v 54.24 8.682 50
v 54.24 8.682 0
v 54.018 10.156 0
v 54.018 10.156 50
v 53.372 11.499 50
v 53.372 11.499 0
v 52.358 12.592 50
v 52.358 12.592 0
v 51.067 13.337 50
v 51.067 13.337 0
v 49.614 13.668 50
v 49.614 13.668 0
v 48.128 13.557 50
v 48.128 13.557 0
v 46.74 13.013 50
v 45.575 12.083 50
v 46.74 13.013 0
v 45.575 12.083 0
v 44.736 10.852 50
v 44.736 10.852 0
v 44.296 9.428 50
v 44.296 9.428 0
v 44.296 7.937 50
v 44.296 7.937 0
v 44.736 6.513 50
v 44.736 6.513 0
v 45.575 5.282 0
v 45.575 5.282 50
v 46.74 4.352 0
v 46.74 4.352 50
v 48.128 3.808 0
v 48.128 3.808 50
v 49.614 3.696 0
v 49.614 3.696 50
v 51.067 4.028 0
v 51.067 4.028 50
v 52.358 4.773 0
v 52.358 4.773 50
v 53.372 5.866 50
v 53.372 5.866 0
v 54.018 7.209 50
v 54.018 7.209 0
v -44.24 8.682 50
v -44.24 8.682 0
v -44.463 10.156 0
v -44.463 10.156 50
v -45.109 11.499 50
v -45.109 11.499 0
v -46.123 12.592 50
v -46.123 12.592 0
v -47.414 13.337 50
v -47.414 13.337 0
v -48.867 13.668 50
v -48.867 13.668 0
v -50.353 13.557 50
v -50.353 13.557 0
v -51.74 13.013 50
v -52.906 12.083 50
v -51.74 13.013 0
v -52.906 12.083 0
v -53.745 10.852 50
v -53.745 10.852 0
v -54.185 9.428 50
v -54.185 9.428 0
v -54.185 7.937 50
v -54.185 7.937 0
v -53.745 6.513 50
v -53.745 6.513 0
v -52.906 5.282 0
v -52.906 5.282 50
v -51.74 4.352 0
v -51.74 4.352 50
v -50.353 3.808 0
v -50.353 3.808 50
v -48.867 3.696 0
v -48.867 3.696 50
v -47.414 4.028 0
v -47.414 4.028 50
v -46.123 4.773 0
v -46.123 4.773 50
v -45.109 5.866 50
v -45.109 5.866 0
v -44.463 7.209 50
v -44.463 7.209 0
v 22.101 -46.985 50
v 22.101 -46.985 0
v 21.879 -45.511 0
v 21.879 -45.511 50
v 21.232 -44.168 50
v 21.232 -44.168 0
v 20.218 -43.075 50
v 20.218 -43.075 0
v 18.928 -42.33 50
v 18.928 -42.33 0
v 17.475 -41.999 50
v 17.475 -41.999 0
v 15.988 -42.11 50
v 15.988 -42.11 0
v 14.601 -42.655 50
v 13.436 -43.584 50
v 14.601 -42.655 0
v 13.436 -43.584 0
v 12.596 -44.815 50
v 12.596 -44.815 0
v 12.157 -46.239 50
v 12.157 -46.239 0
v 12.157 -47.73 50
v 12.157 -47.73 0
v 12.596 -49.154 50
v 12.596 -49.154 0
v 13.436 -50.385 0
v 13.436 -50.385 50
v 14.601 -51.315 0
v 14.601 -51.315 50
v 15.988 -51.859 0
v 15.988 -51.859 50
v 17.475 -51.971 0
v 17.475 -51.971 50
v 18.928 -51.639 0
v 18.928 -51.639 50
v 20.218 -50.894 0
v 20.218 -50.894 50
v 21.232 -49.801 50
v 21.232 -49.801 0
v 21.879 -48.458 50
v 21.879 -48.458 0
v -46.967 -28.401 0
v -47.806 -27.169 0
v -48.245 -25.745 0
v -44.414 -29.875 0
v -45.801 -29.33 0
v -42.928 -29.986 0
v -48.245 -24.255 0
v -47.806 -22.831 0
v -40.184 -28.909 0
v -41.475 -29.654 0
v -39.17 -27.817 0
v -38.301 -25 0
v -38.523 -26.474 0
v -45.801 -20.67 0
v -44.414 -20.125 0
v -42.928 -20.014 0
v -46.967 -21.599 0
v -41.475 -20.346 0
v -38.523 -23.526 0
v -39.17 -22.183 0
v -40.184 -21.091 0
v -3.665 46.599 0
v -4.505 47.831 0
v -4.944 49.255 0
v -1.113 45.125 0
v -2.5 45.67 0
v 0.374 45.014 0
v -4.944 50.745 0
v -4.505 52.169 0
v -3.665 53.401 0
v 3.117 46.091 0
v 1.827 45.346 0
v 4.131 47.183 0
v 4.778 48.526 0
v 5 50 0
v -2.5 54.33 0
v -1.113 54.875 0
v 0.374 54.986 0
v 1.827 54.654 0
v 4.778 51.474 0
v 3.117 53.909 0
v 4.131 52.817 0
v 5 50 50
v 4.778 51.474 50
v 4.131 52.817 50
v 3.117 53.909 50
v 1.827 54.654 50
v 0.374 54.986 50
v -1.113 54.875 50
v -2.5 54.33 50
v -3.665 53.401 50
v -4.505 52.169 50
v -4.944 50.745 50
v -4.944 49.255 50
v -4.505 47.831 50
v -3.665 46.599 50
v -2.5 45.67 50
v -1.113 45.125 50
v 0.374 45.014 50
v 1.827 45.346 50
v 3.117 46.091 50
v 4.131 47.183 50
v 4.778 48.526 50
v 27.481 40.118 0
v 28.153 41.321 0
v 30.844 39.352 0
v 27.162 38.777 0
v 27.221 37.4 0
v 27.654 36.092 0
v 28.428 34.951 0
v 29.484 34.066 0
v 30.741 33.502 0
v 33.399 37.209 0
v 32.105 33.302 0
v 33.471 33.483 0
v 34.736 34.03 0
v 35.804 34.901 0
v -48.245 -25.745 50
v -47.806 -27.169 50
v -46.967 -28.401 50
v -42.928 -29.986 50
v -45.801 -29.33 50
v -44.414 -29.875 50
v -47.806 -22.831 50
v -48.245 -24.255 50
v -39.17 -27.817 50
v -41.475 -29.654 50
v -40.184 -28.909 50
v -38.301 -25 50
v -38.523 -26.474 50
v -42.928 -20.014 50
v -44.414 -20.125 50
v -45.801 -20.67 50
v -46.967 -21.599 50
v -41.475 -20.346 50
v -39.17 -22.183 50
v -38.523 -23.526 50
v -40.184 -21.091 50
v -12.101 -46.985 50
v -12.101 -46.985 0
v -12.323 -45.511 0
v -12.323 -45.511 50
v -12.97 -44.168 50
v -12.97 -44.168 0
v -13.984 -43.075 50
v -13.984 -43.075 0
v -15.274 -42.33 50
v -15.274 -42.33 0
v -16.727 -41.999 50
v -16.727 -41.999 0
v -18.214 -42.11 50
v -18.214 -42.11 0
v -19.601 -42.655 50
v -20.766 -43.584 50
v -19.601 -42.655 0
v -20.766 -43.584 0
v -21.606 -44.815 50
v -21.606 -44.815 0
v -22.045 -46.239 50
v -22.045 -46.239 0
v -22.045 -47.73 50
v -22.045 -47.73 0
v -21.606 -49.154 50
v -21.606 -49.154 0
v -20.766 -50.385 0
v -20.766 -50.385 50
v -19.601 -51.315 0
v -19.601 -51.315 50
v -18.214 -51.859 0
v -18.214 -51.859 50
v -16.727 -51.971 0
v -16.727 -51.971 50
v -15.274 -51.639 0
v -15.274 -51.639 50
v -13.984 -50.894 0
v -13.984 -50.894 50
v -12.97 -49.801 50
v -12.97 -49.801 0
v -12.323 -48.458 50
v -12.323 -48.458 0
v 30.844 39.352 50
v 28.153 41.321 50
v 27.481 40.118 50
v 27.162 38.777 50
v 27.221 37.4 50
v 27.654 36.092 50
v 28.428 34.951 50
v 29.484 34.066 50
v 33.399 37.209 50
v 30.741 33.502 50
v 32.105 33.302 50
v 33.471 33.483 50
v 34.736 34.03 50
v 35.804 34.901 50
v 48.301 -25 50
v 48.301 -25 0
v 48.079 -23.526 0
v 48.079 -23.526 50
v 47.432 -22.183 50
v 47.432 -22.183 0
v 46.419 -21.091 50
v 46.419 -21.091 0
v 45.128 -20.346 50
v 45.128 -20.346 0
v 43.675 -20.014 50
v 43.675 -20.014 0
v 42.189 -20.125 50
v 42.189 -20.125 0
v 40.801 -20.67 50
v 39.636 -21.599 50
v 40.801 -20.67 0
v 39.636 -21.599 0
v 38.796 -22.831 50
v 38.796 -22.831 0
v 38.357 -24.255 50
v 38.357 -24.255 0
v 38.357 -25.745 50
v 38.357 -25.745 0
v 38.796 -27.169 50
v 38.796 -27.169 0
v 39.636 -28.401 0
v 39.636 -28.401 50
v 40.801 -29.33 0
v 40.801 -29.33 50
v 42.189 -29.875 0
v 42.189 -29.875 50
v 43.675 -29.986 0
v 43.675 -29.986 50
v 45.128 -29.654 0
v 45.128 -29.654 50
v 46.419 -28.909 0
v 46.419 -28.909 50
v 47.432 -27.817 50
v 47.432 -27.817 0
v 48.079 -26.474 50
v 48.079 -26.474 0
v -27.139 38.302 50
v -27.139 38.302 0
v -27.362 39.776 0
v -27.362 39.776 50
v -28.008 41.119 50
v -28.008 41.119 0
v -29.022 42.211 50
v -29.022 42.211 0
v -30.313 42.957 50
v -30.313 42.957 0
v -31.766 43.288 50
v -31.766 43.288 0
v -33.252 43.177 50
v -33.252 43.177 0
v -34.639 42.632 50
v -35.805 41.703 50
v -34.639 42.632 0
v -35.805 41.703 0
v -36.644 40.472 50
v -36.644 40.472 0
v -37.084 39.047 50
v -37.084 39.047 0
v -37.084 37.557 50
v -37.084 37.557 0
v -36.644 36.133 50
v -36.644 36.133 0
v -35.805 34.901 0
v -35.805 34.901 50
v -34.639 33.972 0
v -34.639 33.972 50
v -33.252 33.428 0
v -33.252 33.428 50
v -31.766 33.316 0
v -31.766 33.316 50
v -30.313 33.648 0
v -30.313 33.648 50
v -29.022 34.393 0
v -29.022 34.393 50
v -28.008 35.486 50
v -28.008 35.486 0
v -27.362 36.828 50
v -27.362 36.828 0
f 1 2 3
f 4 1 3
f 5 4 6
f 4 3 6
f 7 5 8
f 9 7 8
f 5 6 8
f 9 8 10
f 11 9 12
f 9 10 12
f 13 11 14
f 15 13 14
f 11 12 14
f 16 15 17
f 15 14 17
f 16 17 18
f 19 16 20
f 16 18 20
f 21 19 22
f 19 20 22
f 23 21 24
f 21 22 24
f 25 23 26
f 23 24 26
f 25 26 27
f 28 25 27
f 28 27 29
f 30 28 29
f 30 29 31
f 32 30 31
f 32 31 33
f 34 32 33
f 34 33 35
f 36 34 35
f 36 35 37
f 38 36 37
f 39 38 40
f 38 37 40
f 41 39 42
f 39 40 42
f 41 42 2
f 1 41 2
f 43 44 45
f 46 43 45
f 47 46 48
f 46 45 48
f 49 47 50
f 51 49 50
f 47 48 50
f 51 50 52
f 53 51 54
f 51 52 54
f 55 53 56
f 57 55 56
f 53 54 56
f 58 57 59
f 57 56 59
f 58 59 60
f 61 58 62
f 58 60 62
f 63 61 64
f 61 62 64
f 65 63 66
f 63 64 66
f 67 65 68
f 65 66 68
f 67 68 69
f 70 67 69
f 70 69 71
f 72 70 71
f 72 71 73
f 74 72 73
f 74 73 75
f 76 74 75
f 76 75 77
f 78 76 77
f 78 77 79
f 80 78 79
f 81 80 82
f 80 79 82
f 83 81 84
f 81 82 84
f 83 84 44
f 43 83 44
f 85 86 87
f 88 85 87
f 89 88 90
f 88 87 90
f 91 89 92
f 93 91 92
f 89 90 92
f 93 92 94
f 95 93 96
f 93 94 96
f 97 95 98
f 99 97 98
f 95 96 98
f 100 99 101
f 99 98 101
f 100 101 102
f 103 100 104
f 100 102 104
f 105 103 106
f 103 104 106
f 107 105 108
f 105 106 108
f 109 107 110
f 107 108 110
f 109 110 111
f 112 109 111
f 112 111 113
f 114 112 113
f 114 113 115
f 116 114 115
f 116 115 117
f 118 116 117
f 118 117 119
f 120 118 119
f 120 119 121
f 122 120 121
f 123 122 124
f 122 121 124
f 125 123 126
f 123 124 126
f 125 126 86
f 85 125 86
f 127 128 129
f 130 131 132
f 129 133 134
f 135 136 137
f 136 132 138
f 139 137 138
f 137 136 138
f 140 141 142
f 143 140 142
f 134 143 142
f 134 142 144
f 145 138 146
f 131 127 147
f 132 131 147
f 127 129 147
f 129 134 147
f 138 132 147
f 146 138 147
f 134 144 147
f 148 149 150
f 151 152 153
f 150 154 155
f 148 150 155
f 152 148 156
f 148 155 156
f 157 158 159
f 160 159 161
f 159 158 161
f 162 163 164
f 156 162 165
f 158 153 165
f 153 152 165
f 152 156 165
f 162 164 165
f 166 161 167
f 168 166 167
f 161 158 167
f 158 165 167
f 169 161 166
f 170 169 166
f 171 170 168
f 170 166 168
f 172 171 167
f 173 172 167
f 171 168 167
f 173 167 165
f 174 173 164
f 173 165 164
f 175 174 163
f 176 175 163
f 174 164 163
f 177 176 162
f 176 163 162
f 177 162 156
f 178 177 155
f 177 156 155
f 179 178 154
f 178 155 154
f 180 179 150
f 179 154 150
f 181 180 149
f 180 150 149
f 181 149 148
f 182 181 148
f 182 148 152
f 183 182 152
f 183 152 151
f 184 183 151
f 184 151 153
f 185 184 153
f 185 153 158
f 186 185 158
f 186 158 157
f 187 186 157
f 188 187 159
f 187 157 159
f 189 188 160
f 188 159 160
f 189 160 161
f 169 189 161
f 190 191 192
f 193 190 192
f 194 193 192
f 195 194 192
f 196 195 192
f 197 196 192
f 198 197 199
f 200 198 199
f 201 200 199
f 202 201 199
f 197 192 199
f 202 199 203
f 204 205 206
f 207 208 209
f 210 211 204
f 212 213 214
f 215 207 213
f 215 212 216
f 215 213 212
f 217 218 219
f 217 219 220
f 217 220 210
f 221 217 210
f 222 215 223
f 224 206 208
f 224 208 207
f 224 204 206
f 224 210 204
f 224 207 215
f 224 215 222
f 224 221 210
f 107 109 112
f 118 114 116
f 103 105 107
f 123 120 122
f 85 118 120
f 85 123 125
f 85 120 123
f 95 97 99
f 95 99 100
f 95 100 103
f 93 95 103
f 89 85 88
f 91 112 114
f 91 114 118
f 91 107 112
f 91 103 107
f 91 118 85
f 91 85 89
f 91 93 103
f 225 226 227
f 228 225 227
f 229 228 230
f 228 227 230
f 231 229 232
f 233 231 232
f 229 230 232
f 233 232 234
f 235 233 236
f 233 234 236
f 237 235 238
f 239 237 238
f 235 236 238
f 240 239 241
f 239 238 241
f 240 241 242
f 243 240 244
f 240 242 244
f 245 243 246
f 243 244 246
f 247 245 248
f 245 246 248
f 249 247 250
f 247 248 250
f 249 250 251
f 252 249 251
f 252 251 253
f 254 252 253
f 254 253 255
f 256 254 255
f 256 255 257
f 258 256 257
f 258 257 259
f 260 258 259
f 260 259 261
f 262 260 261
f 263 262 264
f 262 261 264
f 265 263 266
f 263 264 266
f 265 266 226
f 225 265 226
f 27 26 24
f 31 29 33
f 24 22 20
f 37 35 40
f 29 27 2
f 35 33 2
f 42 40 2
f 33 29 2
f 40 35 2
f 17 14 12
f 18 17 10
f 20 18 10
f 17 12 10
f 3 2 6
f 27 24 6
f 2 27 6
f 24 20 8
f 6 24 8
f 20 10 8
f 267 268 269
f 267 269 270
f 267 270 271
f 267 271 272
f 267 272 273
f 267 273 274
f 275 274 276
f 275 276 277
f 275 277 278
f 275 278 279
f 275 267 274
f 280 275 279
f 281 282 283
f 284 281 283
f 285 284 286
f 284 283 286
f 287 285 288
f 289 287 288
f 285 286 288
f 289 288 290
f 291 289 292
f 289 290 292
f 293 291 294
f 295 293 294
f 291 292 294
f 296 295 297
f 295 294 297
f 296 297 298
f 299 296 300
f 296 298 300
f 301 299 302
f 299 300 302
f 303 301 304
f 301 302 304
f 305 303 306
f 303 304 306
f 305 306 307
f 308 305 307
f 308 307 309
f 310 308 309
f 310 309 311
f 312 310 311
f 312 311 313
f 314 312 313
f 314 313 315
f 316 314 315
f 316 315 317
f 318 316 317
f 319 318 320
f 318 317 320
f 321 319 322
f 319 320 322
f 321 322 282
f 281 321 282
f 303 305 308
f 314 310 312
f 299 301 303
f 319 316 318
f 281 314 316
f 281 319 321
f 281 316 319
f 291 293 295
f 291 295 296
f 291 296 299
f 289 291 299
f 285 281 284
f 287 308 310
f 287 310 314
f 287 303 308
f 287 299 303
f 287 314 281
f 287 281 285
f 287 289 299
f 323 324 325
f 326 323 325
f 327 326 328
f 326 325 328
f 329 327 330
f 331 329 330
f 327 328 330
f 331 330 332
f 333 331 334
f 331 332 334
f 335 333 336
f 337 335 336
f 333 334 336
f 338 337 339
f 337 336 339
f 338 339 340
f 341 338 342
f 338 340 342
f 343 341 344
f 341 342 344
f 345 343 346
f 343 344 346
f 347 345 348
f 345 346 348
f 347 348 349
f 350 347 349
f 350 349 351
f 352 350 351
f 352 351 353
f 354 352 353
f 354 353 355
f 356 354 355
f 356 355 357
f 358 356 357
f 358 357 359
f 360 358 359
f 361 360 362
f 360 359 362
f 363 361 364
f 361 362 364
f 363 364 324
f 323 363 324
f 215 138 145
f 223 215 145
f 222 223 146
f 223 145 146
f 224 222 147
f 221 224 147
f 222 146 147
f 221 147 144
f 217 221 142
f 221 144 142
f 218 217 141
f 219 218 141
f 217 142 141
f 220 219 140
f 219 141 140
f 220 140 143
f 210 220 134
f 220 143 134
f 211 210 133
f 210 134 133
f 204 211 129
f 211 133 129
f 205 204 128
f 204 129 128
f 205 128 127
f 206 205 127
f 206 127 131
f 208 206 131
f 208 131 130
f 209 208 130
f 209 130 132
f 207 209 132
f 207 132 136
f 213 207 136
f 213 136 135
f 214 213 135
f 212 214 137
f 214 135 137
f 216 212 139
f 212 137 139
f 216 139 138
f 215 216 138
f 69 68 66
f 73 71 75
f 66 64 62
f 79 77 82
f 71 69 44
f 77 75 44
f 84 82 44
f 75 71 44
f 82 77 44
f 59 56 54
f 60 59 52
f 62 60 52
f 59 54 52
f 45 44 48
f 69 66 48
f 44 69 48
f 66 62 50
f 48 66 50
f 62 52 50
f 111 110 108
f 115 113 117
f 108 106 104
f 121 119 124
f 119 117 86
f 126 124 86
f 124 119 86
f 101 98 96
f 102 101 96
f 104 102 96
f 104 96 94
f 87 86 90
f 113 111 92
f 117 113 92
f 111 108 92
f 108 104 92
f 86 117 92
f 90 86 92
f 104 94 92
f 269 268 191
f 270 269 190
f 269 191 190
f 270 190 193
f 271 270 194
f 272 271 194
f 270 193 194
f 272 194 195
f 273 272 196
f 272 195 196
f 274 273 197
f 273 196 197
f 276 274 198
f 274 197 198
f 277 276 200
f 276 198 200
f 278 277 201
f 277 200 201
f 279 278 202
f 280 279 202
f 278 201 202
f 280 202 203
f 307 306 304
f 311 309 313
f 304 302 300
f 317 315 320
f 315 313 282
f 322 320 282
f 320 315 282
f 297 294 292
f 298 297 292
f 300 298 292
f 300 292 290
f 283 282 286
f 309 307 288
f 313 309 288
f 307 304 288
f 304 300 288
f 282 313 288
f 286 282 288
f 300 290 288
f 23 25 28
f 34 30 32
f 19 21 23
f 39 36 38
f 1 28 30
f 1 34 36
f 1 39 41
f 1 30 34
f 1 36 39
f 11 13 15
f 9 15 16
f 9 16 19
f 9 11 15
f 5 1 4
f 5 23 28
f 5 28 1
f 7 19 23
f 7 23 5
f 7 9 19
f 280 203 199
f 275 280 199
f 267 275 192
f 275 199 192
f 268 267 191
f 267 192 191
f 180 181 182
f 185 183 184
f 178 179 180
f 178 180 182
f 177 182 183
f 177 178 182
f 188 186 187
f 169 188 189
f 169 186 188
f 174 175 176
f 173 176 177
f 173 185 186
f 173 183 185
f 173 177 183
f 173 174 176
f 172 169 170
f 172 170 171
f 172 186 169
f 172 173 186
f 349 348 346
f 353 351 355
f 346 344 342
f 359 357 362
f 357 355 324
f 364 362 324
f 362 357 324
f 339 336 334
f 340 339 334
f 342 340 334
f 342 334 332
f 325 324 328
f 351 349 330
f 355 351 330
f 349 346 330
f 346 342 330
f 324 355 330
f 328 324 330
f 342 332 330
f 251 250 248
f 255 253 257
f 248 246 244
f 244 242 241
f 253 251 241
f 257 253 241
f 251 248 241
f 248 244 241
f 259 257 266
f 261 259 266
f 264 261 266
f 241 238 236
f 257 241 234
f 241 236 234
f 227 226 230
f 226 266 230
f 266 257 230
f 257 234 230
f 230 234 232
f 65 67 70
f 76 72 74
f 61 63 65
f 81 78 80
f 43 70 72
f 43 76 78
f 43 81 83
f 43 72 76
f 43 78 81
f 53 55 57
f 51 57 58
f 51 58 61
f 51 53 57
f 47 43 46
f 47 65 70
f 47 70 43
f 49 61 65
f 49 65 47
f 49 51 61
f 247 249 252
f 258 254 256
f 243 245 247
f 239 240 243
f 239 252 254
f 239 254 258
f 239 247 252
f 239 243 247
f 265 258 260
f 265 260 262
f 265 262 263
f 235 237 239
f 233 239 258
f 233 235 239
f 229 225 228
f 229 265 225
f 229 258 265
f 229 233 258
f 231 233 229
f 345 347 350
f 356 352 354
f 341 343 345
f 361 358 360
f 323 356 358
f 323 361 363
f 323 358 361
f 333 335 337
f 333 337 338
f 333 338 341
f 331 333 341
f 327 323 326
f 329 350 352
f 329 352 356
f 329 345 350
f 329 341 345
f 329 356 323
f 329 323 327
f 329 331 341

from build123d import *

# Parameters (mm, degrees)
F0_R     = 50
F1_DEPTH = 50
F2_R     = 5
F3_DEPTH = 50


with BuildPart() as f1:
    # F0 (on Top) → F1 (new body)
    with BuildSketch(Plane.XY):
        Circle(F0_R)
    extrude(amount=F1_DEPTH)


with BuildPart() as f3:
    # F2 (on Top) → F3 (new body, through all)
    with BuildSketch(Plane.XY):
        with Locations((0, 50)):
            Circle(F2_R)
    extrude(amount=F3_DEPTH)


with BuildPart() as f3b:
    # F2 (on Top) → F3, piece 2 (new body, through all)
    with BuildSketch(Plane.XY):
        with Locations((-32.1393804843, 38.3022221559)):
            Circle(F2_R)
    extrude(amount=F3_DEPTH)


with BuildPart() as f3c:
    # F2 (on Top) → F3, piece 3 (new body, through all)
    with BuildSketch(Plane.XY):
        with Locations((-49.2403876506, 8.6824088833)):
            Circle(F2_R)
    extrude(amount=F3_DEPTH)


with BuildPart() as f3d:
    # F2 (on Top) → F3, piece 4 (new body, through all)
    with BuildSketch(Plane.XY):
        with Locations((-43.3012701892, -25)):
            Circle(F2_R)
    extrude(amount=F3_DEPTH)


with BuildPart() as f3e:
    # F2 (on Top) → F3, piece 5 (new body, through all)
    with BuildSketch(Plane.XY):
        with Locations((-17.1010071663, -46.9846310393)):
            Circle(F2_R)
    extrude(amount=F3_DEPTH)


with BuildPart() as f3f:
    # F2 (on Top) → F3, piece 6 (new body, through all)
    with BuildSketch(Plane.XY):
        with Locations((17.1010071663, -46.9846310393)):
            Circle(F2_R)
    extrude(amount=F3_DEPTH)


with BuildPart() as f3g:
    # F2 (on Top) → F3, piece 7 (new body, through all)
    with BuildSketch(Plane.XY):
        with Locations((43.3012701892, -25)):
            Circle(F2_R)
    extrude(amount=F3_DEPTH)


with BuildPart() as f3h:
    # F2 (on Top) → F3, piece 8 (new body, through all)
    with BuildSketch(Plane.XY):
        with Locations((49.2403876506, 8.6824088833)):
            Circle(F2_R)
    extrude(amount=F3_DEPTH)


with BuildPart() as f3i:
    # F2 (on Top) → F3, piece 9 (new body, through all)
    with BuildSketch(Plane.XY):
        with Locations((32.1393804843, 38.3022221559)):
            Circle(F2_R)
    extrude(amount=F3_DEPTH)

    # F4: intersect F1
    add(f1.part, mode=Mode.INTERSECT)


solid = Compound([f3.part, f3b.part, f3c.part, f3d.part, f3e.part, f3f.part, f3g.part, f3h.part, f3i.part])
